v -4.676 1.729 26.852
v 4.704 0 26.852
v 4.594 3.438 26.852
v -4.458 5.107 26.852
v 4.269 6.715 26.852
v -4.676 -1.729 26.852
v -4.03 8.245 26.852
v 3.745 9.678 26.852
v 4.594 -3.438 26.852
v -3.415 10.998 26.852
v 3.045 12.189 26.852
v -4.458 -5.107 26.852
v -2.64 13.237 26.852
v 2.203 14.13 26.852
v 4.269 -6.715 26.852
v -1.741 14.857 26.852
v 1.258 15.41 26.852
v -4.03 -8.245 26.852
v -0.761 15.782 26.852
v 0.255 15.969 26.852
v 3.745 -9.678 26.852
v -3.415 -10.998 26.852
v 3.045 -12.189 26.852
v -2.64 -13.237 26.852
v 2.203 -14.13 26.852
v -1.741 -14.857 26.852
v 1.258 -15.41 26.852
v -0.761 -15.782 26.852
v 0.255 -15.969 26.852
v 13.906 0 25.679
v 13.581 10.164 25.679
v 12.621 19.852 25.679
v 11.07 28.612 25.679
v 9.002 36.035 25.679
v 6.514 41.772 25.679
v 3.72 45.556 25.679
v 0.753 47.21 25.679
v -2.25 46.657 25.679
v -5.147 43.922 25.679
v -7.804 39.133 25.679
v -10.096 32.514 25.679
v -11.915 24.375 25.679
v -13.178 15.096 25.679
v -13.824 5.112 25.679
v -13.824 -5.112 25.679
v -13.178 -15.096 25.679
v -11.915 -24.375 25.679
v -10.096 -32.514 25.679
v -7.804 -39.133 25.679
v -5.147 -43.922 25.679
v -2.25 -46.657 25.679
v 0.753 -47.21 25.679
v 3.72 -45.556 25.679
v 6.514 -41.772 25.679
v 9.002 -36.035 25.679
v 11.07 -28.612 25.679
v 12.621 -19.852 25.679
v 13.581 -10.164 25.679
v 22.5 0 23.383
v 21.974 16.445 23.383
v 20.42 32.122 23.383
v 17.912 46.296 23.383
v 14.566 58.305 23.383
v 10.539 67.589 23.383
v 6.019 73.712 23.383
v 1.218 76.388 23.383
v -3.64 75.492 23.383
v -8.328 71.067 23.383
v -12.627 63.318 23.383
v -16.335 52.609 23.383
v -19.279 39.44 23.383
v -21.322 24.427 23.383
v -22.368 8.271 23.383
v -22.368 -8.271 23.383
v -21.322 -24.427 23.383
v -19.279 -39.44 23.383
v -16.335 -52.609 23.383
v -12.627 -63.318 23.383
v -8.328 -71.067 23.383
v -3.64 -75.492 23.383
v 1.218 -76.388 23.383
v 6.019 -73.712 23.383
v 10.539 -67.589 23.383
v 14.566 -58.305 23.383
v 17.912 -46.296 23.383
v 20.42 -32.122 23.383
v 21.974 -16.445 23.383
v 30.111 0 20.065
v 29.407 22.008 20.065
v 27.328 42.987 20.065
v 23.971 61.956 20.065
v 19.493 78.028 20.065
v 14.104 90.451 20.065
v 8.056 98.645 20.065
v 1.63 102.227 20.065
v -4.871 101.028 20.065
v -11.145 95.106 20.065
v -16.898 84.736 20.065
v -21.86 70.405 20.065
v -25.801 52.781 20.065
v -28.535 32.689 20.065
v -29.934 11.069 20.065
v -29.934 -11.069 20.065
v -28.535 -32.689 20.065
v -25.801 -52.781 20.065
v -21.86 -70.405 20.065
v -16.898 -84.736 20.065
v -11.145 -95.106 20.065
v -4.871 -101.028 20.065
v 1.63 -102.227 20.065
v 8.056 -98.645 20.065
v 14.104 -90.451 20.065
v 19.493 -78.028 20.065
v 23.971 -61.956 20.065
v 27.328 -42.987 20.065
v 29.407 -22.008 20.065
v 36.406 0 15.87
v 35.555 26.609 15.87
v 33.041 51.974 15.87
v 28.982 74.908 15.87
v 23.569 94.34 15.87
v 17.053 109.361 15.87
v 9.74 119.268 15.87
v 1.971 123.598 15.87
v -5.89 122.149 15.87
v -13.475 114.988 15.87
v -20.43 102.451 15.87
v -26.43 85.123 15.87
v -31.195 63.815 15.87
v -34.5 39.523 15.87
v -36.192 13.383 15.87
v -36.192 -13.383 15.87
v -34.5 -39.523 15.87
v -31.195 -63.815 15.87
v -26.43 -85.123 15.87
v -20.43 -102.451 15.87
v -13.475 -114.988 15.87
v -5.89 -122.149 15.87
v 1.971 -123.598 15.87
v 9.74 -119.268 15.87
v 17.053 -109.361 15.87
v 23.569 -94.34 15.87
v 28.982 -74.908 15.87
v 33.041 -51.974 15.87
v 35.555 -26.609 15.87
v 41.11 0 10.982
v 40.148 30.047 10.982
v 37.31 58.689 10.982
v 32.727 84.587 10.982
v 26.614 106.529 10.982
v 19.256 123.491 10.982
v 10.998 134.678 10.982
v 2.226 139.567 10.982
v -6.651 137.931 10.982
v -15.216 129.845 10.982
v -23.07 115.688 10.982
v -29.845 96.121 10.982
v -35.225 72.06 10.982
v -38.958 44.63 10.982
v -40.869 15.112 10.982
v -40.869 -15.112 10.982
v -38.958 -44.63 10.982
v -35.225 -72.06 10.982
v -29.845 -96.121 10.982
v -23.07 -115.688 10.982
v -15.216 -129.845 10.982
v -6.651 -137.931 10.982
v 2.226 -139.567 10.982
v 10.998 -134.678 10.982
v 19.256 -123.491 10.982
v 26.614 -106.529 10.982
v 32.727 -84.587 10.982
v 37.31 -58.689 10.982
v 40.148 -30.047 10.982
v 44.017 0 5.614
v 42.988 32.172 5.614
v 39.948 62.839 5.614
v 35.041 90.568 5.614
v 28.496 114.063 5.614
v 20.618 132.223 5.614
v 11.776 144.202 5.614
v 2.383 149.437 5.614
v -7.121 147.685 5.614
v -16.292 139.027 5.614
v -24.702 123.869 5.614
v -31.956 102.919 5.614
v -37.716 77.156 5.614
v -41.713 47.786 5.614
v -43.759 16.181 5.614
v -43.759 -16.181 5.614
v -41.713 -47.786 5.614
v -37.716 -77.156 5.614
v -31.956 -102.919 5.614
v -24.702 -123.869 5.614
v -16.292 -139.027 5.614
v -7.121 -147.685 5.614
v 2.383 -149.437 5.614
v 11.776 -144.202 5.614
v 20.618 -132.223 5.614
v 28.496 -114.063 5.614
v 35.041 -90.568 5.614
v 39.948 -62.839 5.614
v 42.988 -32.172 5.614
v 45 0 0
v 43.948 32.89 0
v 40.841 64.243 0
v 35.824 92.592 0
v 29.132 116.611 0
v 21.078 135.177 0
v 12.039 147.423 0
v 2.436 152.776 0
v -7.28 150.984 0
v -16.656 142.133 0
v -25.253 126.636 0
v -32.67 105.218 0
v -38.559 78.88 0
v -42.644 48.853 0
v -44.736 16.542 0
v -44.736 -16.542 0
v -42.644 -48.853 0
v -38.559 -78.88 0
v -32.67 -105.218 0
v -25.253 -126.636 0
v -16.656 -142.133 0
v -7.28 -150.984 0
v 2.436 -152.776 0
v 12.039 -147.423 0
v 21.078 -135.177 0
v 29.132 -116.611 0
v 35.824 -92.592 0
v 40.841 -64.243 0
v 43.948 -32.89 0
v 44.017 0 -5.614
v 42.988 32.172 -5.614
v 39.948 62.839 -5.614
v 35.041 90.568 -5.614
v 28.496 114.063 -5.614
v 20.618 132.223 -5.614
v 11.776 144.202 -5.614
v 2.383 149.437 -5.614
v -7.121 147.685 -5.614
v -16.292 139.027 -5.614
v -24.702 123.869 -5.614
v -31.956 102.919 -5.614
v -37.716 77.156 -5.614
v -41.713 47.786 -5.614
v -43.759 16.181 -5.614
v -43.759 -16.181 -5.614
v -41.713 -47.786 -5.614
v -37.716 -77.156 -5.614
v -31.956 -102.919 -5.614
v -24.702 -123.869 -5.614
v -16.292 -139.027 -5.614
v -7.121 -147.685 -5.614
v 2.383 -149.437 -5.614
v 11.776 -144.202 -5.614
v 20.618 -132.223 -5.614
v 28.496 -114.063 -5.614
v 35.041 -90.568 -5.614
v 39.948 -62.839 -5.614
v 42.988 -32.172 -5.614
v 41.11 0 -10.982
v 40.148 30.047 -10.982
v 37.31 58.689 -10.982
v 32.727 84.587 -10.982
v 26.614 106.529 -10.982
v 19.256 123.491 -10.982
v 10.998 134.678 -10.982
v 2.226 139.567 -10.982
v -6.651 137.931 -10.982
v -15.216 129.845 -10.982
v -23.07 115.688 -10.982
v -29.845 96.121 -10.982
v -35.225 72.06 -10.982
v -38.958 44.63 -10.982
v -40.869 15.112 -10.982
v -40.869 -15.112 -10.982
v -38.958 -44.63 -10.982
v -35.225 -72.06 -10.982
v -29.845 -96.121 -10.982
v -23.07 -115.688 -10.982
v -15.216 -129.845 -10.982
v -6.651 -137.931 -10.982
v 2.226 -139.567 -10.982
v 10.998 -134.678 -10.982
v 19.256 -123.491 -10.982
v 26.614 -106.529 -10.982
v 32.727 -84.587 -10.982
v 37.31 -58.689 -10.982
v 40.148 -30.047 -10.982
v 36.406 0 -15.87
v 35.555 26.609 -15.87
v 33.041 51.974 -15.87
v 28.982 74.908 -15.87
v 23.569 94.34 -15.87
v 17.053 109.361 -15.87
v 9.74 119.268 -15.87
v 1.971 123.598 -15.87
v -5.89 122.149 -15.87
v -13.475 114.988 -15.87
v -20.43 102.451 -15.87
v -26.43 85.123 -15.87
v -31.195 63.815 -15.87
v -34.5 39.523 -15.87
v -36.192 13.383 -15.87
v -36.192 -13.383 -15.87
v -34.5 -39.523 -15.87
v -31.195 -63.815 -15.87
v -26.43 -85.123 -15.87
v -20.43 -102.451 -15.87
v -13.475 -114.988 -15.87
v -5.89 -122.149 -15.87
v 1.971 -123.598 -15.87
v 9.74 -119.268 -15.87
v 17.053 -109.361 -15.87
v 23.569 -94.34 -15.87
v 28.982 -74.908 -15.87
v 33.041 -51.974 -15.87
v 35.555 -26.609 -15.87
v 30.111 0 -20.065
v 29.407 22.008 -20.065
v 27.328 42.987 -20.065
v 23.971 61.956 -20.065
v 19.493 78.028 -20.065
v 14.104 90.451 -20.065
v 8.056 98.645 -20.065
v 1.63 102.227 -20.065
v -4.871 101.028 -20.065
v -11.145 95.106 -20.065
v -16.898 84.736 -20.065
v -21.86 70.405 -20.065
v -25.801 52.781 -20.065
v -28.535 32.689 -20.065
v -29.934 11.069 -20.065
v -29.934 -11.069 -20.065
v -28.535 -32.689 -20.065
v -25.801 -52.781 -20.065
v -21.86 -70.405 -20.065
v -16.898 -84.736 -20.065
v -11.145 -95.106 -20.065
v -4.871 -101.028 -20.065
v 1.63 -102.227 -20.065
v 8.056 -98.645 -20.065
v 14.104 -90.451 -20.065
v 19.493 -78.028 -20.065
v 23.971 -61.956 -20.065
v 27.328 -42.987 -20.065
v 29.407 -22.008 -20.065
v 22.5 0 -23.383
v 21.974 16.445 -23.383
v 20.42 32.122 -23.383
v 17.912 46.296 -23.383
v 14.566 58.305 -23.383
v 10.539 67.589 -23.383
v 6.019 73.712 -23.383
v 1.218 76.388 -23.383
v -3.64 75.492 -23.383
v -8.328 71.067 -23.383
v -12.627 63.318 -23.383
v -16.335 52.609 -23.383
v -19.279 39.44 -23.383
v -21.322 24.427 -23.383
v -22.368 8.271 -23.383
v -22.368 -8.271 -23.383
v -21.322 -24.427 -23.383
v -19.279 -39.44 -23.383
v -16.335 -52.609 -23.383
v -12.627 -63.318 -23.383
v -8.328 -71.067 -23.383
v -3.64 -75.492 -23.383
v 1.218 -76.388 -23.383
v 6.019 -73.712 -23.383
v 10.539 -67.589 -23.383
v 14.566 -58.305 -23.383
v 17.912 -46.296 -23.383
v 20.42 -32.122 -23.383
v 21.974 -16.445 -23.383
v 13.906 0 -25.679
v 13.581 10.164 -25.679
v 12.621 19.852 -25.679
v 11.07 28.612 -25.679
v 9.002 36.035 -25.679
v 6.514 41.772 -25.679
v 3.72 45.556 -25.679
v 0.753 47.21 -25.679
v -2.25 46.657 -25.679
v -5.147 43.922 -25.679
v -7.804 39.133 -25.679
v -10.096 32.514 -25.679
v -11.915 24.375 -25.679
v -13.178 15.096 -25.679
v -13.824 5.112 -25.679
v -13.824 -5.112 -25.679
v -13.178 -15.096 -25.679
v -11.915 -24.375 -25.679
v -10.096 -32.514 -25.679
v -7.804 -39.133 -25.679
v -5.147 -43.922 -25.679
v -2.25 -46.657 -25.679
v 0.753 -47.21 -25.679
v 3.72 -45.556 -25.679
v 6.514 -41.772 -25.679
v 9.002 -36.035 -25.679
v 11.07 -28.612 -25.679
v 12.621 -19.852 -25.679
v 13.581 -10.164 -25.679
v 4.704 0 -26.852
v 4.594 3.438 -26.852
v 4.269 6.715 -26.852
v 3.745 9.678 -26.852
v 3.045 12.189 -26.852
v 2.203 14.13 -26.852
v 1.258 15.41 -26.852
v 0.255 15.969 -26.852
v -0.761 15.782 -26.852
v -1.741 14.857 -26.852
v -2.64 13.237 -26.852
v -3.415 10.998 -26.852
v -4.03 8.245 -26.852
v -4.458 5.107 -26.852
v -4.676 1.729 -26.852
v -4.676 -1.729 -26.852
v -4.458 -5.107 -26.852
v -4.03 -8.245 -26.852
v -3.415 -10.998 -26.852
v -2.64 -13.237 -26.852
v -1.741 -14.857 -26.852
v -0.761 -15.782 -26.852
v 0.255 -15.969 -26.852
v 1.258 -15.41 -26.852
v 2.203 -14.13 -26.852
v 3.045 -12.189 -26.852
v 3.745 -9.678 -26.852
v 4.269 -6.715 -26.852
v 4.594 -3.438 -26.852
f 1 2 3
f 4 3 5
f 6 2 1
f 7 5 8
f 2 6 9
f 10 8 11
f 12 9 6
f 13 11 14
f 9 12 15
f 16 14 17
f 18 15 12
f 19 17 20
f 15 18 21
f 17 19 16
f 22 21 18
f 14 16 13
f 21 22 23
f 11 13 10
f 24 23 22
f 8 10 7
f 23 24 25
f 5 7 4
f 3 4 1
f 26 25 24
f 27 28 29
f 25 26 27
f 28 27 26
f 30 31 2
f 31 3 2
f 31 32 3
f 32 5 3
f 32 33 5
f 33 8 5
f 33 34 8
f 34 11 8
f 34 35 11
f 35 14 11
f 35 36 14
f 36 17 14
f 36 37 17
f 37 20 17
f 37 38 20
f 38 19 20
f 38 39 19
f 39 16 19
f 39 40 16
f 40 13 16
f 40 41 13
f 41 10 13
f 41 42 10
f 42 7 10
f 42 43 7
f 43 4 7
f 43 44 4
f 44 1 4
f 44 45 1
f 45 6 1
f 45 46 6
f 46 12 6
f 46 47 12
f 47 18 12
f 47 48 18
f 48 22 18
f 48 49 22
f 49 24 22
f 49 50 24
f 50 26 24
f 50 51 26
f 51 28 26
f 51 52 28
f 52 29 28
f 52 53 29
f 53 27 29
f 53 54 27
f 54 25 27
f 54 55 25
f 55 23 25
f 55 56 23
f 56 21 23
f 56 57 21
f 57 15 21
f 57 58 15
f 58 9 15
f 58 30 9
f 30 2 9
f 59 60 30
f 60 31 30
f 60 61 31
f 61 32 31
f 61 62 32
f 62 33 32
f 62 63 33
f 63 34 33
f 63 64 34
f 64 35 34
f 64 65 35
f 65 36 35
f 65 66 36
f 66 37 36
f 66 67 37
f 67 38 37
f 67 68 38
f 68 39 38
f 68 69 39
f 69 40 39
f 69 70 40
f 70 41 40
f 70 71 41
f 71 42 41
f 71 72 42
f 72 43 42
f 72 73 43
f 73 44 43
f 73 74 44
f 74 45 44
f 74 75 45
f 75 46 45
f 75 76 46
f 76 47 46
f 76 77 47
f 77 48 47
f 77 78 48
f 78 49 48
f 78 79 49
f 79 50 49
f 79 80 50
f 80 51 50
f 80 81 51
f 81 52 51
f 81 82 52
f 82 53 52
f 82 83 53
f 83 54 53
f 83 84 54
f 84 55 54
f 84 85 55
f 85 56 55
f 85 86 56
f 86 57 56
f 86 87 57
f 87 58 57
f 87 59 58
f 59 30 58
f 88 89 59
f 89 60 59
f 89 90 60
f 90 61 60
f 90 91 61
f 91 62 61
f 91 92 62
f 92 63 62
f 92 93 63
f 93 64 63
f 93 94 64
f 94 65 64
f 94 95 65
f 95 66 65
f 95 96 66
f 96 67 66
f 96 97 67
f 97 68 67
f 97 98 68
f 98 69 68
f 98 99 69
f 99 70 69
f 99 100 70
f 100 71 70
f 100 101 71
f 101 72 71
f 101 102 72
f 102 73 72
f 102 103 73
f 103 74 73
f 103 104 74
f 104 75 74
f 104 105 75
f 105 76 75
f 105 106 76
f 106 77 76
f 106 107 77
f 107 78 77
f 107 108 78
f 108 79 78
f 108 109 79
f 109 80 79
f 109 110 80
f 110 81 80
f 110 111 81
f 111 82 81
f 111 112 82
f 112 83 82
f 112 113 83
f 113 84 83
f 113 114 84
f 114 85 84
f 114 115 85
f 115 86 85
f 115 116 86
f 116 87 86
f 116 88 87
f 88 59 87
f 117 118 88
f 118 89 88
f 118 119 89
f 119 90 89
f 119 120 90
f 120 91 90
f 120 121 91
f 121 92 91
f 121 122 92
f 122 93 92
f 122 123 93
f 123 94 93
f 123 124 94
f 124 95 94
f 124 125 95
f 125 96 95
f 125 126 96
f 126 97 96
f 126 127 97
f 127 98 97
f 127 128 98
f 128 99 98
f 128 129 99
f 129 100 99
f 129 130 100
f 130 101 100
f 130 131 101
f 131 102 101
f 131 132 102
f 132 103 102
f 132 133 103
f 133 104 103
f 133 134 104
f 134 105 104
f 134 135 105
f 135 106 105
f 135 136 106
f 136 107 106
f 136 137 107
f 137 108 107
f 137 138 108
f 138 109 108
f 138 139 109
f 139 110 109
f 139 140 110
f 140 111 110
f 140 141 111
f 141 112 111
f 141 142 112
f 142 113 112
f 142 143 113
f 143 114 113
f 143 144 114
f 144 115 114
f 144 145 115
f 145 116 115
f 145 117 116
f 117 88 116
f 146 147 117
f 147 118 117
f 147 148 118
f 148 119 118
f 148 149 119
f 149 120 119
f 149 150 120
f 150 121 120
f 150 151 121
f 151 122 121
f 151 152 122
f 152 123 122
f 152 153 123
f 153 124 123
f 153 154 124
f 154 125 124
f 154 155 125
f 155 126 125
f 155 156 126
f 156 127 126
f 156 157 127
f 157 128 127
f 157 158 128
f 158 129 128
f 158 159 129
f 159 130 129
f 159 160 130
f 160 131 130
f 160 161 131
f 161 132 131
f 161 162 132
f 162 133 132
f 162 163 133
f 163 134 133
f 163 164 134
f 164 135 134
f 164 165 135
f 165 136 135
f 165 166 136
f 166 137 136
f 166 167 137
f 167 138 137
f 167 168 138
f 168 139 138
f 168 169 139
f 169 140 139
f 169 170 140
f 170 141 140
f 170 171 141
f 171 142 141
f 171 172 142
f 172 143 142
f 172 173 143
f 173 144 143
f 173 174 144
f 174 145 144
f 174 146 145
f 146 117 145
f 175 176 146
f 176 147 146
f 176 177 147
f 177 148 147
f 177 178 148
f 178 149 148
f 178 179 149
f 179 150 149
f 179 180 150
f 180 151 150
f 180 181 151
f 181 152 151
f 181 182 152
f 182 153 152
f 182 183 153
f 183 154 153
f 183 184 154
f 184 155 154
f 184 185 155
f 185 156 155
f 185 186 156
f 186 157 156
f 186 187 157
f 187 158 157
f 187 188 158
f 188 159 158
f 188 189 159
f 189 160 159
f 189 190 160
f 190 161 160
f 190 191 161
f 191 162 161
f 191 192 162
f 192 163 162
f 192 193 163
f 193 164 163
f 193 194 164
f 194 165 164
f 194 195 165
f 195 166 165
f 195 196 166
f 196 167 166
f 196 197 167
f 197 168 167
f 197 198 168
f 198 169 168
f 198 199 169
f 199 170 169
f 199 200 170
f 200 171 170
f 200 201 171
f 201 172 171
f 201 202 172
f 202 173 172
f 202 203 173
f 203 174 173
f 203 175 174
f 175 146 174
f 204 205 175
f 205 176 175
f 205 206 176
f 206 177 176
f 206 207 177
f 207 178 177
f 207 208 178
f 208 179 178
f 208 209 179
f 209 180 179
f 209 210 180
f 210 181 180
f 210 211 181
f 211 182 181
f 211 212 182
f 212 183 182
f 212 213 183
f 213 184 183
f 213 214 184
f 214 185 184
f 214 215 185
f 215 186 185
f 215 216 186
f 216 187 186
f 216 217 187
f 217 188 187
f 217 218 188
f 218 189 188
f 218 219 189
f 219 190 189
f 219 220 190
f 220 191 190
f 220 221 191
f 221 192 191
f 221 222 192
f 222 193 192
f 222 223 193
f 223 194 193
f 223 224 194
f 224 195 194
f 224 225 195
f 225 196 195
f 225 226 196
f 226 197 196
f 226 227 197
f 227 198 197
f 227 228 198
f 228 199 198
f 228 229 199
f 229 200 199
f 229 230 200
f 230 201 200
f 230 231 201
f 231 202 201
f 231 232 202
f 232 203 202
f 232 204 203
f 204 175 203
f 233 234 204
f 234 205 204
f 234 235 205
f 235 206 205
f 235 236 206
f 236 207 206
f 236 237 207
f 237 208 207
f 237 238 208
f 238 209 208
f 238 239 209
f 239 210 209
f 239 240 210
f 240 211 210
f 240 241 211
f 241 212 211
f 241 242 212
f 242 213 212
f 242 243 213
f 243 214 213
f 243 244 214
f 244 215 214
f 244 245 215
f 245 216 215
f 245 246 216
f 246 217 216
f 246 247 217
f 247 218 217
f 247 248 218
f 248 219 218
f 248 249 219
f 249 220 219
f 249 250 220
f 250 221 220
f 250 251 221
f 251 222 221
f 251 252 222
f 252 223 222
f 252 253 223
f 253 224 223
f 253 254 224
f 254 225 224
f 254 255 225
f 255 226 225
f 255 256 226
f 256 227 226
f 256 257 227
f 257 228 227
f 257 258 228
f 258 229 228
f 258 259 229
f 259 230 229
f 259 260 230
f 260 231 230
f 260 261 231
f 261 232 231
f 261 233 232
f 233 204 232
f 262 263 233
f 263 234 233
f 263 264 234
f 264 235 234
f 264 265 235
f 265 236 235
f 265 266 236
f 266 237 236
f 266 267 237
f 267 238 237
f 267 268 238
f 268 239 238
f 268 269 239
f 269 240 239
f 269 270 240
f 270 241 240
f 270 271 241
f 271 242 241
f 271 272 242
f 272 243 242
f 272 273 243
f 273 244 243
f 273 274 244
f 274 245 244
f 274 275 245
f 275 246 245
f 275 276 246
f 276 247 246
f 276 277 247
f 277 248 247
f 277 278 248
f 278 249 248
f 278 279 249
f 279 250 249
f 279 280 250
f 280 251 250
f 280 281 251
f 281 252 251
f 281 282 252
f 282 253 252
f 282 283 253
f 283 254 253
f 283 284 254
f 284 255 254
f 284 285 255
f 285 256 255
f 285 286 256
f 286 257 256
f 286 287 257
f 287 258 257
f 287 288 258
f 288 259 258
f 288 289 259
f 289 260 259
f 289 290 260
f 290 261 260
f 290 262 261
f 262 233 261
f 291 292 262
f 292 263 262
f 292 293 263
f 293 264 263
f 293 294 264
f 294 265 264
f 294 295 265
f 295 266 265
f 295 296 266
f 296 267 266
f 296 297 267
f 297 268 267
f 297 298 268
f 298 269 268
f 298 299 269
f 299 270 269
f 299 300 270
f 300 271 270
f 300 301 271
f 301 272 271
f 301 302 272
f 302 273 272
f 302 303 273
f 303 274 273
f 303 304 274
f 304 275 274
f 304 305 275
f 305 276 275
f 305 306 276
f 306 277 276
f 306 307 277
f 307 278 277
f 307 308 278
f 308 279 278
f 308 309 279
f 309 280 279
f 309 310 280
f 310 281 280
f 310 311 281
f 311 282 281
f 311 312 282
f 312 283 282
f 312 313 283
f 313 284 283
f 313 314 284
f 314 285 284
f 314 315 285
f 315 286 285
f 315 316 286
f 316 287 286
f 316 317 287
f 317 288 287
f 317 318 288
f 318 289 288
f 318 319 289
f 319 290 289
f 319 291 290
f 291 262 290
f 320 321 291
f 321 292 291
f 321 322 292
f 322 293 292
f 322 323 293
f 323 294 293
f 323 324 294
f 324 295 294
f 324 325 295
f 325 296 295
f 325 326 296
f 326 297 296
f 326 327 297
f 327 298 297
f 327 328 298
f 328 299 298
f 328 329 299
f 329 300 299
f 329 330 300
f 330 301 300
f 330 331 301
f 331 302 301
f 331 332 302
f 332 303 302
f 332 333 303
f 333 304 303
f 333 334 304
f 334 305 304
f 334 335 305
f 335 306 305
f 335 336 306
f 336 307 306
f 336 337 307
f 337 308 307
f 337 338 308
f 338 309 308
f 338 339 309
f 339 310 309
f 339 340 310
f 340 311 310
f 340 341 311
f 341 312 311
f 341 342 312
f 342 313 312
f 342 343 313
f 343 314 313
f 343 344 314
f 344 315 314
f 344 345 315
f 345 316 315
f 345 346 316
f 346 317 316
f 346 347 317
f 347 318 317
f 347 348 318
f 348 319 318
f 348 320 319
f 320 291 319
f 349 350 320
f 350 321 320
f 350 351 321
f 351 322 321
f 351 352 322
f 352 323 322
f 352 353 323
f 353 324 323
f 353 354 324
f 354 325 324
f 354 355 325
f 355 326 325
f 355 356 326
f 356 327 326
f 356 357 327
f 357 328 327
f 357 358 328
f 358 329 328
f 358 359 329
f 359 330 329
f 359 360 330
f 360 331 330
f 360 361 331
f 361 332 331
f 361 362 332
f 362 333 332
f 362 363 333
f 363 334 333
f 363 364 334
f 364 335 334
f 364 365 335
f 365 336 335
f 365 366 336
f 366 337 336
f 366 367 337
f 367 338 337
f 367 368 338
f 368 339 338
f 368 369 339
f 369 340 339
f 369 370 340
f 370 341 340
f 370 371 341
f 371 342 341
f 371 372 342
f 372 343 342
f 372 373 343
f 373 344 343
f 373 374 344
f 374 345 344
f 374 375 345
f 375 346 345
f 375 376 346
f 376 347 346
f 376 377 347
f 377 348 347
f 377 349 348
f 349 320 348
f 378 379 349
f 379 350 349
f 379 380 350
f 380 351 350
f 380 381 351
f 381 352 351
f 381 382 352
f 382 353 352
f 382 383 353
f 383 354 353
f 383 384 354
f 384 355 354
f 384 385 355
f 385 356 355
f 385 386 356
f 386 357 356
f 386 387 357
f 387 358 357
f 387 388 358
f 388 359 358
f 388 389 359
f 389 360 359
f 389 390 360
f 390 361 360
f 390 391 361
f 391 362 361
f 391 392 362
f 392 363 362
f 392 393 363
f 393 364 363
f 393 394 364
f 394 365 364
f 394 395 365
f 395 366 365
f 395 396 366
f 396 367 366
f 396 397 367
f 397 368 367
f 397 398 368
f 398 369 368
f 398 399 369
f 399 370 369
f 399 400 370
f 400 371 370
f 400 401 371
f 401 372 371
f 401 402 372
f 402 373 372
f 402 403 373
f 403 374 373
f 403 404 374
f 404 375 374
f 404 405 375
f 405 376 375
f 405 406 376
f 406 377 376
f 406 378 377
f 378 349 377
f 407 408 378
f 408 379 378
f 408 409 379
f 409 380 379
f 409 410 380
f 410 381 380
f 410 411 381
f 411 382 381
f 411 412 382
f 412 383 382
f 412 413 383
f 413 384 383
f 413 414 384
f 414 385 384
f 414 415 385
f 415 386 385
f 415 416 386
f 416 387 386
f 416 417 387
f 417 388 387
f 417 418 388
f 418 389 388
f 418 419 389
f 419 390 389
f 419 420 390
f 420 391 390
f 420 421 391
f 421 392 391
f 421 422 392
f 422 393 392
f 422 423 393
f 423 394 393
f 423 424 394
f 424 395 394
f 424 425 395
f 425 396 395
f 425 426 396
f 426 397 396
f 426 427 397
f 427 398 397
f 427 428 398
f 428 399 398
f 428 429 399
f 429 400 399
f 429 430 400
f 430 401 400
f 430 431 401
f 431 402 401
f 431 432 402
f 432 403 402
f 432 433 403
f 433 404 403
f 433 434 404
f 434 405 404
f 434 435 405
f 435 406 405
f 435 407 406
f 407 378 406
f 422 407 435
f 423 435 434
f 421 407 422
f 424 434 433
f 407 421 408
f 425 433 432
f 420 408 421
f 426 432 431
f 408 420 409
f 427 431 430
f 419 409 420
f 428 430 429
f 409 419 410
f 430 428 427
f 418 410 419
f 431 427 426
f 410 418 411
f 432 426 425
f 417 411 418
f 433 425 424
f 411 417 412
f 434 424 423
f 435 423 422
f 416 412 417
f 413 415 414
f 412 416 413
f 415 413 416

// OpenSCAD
// Generated by SolidPython 1.0.1 on 2020-07-29 00:46:46


scale(v = [5, 17, 3]) {
	sphere(r = 9);
}
/***********************************************
*********      SolidPython code:      **********
************************************************
 
# import packages: SolidPython
from solid import *
from solid.utils import *
from itertools import chain, combinations, permutations


class Resize:

    def __init__(self, scad_file):
        self.scad_file = scad_file
        #self.scad_file = import_scad(scad_file)
        # cone/cylinder param:
        self.r1 = 0
        self.r2 = 0
        self.h = 0
        # rectangular prism param:
        self.w = 0
        self.l = 0
        # ellipse param:
        self.r = 0

    # import OpenScad code (file name corresponds to shape)


    # classify shape + parameters
    def assign(self, param1, param2, param3):
        if self.scad_file == 'cone.scad':
            self.r1 = param1
            self.r2 = param2
            self.h = param3
        elif self.scad_file == 'cylinder.scad':
            self.r1 = param1
            self.r2 = param2
            self.h = param3
        elif self.scad_file == 'rectangularPrism.scad':
            self.h = param1
            self.l = param2
            self.w = param3
        else:
            self.r = param1
            self.h = param2

    # resize parameters
    def iterate(self):
        x = range(3, 20, 2)
        i = 1
        if self.scad_file == 'cone.scad':
            tempList = list(permutations(x, 2))
            for temp in tempList:
                param1 = temp[0]
                param2 = temp[1]
                filepath = 'produced_scad_files/' + 'cone' + str(param1) + '_' + str(param2) + '_' + '.scad'
                scad_render_to_file(cylinder(h=param1, r1=param2, r2=0), filepath)

        elif self.scad_file == 'cylinder.scad':
            tempList = list(permutations(x, 3))
            for temp in tempList:
                param1 = temp[0]
                param2 = temp[1]
                filepath = 'produced_scad_files/' + 'cylinder' + str(param1) + '_' + str(param2) + '_' + '.scad'
                scad_render_to_file(cylinder(h=param1, r1=param2, r2=param2), filepath)

        elif self.scad_file == 'rectangularPrism.scad':
            tempList = list(permutations(x, 3))
            for temp in tempList:
                param1 = temp[0]
                param2 = temp[1]
                param3 = temp[2]
                filepath = 'produced_scad_files/' + 'rectangularPrism' + str(param1) + '_' + str(param2) + '_' + str(
                    param3) + '.scad'
                scad_render_to_file(cube(size=(param1, param2, param3)), filepath)

        elif self.scad_file == 'ellipse.scad':
            tempList = list(permutations(x, 4))
            for temp in tempList:
                param1 = temp[0]
                param2 = temp[1]
                param3 = temp[2]
                param4 = temp[3]
                filepath = 'produced_scad_files/' + 'ellipse' + str(param1) + '_' + str(param2) + '_' + str(param3) + '_' + str(param4) + '.scad'
                scad_render_to_file(scale([param1, param2, param3])(sphere(r=param4)), filepath)

    def render_to_scadfile(self):
        scad_render_to_file(scad, 'example.scad') 
 
************************************************/
